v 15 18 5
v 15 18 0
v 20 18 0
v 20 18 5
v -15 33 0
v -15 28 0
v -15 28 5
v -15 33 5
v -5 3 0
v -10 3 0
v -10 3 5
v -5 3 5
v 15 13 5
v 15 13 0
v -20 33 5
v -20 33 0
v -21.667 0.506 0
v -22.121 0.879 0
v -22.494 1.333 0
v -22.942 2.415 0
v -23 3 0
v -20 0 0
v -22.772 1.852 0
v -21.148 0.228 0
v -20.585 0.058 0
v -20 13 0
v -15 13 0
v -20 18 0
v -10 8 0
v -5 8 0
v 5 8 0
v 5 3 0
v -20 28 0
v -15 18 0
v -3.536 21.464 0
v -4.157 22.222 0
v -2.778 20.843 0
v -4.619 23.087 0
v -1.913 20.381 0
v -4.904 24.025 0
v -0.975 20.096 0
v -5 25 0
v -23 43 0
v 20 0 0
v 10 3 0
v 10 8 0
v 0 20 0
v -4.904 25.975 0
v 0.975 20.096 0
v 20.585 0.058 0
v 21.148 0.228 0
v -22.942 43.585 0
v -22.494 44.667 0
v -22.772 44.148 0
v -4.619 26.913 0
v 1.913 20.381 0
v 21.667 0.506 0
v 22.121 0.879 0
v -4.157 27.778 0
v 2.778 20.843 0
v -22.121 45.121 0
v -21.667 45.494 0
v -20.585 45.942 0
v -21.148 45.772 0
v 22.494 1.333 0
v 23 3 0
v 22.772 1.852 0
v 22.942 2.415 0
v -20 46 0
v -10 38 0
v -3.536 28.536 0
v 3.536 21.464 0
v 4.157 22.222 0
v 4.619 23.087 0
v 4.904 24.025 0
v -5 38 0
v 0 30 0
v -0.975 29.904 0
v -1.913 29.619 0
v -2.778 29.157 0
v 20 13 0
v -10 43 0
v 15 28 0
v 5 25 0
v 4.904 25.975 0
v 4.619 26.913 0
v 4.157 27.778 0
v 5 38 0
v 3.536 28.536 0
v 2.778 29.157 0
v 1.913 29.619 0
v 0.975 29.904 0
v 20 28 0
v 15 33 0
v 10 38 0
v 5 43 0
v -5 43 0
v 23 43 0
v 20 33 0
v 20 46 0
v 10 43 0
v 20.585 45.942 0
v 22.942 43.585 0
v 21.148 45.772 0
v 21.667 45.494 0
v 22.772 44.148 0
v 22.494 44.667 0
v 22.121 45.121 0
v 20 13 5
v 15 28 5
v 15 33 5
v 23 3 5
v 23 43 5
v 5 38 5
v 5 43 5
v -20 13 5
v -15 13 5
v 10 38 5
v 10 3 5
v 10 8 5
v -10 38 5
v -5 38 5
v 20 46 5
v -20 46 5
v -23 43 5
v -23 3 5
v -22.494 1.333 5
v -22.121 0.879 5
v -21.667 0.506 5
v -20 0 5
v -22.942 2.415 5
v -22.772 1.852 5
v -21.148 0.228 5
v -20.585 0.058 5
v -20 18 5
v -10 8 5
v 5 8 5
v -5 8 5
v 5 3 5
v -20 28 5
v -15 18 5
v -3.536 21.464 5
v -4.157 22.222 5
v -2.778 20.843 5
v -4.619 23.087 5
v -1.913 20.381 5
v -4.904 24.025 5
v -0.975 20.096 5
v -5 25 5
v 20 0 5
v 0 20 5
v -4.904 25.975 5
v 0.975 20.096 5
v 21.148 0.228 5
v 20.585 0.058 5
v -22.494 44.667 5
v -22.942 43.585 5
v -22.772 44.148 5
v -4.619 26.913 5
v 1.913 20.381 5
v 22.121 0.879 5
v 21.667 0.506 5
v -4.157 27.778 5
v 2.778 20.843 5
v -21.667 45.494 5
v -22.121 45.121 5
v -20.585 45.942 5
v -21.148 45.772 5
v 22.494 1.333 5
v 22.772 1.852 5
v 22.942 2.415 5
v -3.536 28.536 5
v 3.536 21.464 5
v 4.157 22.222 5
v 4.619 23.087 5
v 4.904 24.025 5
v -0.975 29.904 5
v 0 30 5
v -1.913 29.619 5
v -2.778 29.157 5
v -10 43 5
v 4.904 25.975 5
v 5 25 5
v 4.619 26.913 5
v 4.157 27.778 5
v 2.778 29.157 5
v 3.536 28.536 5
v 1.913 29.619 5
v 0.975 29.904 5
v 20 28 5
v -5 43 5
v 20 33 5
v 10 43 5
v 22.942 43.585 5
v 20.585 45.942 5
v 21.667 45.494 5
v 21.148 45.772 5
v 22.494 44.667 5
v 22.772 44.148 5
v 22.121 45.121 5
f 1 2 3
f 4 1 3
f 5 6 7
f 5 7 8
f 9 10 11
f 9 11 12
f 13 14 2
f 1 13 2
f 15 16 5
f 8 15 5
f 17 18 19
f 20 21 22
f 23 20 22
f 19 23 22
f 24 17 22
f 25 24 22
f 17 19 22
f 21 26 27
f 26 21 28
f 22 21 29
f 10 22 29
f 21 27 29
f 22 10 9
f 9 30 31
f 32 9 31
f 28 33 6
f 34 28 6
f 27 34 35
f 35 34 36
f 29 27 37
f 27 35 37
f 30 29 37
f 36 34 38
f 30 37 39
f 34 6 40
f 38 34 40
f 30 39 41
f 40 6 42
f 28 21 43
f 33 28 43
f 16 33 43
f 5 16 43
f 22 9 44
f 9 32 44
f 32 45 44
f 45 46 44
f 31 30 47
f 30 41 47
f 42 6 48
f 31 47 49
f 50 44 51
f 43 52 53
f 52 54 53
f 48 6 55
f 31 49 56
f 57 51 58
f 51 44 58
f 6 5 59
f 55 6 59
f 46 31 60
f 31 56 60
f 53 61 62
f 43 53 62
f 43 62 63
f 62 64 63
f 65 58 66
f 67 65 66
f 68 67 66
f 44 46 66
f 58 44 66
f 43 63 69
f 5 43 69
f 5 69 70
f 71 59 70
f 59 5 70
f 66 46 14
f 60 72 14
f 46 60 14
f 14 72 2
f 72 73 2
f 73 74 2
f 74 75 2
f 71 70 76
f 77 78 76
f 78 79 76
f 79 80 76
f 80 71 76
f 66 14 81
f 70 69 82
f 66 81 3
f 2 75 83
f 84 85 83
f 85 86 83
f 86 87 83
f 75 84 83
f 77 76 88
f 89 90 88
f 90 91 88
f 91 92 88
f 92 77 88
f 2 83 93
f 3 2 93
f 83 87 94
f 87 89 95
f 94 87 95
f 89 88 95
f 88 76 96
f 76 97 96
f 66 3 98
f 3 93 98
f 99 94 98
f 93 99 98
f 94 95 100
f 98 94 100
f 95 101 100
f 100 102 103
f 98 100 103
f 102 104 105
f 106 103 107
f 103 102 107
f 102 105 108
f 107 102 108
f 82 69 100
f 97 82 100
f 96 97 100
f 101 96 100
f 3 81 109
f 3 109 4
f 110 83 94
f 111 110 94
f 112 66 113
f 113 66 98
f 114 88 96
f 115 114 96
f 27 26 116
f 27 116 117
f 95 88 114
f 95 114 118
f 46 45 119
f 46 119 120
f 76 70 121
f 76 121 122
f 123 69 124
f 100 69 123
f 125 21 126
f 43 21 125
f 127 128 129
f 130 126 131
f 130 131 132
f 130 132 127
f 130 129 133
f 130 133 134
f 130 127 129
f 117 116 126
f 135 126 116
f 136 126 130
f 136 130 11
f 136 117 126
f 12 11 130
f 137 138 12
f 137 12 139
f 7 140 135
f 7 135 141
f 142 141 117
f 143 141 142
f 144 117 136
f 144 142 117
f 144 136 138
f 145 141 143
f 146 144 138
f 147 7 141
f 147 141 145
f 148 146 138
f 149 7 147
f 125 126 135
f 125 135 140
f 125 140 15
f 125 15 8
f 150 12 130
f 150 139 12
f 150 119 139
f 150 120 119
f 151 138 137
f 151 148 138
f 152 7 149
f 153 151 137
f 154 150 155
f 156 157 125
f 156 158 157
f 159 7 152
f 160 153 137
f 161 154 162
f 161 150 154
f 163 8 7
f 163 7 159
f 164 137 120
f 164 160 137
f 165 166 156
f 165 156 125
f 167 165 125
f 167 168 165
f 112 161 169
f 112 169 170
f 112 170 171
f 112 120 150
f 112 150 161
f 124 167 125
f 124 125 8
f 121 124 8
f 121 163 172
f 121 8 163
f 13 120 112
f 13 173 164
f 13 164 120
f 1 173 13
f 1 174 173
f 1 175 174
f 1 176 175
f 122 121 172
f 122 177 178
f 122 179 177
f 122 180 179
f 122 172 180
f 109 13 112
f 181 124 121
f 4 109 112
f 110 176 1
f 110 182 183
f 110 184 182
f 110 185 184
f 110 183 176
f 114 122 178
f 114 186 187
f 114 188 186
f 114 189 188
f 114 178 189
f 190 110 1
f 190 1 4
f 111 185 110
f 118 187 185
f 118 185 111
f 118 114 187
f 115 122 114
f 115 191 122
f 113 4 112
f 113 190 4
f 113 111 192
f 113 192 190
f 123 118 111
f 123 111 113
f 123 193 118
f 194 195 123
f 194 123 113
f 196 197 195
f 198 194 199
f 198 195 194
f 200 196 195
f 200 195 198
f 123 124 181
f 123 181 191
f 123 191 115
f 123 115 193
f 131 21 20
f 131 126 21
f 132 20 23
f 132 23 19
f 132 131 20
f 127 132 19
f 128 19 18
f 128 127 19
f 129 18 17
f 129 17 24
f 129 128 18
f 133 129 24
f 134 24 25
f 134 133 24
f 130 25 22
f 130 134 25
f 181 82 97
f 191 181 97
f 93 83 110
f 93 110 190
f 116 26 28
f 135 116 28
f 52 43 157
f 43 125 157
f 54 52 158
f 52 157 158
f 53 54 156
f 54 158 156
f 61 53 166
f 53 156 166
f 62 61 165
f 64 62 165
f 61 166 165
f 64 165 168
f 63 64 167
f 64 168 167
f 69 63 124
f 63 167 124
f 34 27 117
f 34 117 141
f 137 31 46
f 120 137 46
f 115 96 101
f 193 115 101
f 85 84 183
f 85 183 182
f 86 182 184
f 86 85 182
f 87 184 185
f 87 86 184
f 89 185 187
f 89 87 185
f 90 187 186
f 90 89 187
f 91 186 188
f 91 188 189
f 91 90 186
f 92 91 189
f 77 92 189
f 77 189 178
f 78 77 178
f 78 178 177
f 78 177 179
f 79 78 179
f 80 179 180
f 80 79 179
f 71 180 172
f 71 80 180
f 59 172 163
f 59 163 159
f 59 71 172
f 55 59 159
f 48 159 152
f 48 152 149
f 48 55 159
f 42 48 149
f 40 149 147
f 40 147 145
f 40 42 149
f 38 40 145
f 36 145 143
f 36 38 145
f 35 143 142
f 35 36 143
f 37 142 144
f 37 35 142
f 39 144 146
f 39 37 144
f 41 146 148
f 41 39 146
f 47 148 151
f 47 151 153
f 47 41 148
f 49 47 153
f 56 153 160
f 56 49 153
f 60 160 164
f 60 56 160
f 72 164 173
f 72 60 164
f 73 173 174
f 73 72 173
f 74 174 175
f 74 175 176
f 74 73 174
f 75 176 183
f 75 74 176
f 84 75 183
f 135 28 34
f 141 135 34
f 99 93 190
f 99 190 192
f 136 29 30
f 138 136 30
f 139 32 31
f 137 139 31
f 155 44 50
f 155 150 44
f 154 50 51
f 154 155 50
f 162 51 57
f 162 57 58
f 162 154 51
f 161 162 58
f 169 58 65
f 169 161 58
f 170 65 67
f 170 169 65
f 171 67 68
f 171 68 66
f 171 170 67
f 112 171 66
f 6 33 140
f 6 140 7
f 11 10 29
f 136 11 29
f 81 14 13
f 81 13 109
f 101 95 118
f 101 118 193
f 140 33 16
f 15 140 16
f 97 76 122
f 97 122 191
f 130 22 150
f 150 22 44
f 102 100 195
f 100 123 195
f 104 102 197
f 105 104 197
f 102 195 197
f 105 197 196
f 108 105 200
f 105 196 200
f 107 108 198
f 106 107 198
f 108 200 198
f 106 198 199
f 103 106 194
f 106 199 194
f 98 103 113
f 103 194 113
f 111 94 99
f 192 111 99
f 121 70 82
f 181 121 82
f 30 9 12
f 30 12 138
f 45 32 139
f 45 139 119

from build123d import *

# Parameters (mm, degrees)
BOSS_EXTRU_1_OUTLINE_W   = 46
BOSS_EXTRU_1_OUTLINE_H   = 46
BOSS_EXTRU_1_OUTLINE_W_2 = 5
BOSS_EXTRU_1_OUTLINE_H_2 = 5
BOSS_EXTRU_1_OUTLINE_R   = 5
BOSS_EXTRU_1_DEPTH       = 5
CONG_1_R                 = 3


# Read off the part's stored shape, not the designer's step: Boss.-Extru.1
with BuildPart() as part:
    # Boss.-Extru.1 outline → Boss.-Extru.1 (new body)
    with BuildSketch(Plane.XY):
        with Locations((0, 23)):
            Rectangle(BOSS_EXTRU_1_OUTLINE_W, BOSS_EXTRU_1_OUTLINE_H)
        with Locations((-7.5, 5.5)):
            Rectangle(BOSS_EXTRU_1_OUTLINE_W_2, BOSS_EXTRU_1_OUTLINE_H_2, mode=Mode.SUBTRACT)
        with Locations((-17.5, 15.5)):
            Rectangle(BOSS_EXTRU_1_OUTLINE_W_2, BOSS_EXTRU_1_OUTLINE_H_2, mode=Mode.SUBTRACT)
        with Locations((7.5, 5.5)):
            Rectangle(BOSS_EXTRU_1_OUTLINE_W_2, BOSS_EXTRU_1_OUTLINE_H_2, mode=Mode.SUBTRACT)
        with Locations((17.5, 15.5)):
            Rectangle(BOSS_EXTRU_1_OUTLINE_W_2, BOSS_EXTRU_1_OUTLINE_H_2, mode=Mode.SUBTRACT)
        with Locations((-17.5, 30.5)):
            Rectangle(BOSS_EXTRU_1_OUTLINE_W_2, BOSS_EXTRU_1_OUTLINE_H_2, mode=Mode.SUBTRACT)
        with Locations((-7.5, 40.5)):
            Rectangle(BOSS_EXTRU_1_OUTLINE_W_2, BOSS_EXTRU_1_OUTLINE_H_2, mode=Mode.SUBTRACT)
        with Locations((0, 25)):
            Circle(BOSS_EXTRU_1_OUTLINE_R, mode=Mode.SUBTRACT)
        with Locations((17.5, 30.5)):
            Rectangle(BOSS_EXTRU_1_OUTLINE_W_2, BOSS_EXTRU_1_OUTLINE_H_2, mode=Mode.SUBTRACT)
        with Locations((7.5, 40.5)):
            Rectangle(BOSS_EXTRU_1_OUTLINE_W_2, BOSS_EXTRU_1_OUTLINE_H_2, mode=Mode.SUBTRACT)
    extrude(amount=BOSS_EXTRU_1_DEPTH)

    # Congé1
    cong_1_edges = [part.edges().sort_by_distance(p)[0] for p in [
        (-23, 0, 2.5),
        (-23, 46, 2.5),
        (23, 46, 2.5),
        (23, 0, 2.5),
    ]]
    fillet(cong_1_edges, radius=CONG_1_R)


solid = part.part
